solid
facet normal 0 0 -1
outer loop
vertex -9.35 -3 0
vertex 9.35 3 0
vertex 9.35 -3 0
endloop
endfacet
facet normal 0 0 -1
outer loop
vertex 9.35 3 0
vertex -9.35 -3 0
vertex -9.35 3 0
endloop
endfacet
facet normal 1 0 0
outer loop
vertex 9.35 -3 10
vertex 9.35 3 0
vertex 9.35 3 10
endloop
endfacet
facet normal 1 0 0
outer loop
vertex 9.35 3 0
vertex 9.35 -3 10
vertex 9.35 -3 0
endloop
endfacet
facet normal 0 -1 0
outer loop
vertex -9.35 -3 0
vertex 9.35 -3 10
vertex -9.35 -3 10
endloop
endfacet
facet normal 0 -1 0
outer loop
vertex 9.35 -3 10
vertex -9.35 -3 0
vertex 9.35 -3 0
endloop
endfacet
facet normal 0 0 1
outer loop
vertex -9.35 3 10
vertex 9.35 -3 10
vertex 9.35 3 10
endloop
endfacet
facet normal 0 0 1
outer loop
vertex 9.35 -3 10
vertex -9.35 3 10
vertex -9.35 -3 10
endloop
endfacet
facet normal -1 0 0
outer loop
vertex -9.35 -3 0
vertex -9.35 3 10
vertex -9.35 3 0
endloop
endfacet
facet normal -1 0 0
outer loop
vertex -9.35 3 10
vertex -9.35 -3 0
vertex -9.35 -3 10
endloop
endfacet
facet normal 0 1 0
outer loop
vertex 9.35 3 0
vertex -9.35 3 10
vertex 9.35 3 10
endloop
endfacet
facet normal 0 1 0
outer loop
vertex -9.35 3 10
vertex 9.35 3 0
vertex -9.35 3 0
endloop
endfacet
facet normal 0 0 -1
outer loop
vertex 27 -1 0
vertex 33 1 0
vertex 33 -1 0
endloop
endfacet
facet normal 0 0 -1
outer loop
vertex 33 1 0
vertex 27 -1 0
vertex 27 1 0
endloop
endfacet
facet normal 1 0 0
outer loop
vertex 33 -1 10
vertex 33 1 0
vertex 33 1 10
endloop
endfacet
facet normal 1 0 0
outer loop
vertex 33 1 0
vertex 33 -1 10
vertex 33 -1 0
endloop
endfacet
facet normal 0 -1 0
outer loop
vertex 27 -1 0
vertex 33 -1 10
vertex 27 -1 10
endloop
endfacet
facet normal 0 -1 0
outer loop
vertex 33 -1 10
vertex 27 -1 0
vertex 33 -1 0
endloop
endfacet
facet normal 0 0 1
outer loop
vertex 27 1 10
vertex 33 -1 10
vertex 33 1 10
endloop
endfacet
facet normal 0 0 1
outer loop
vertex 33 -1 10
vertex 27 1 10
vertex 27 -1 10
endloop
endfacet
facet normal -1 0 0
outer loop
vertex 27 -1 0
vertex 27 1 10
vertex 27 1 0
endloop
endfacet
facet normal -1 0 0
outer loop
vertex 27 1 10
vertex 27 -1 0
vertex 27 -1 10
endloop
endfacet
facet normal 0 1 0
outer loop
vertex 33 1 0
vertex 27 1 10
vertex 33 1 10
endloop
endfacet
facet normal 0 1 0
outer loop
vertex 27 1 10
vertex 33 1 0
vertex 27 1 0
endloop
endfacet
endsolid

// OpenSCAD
// Built by bench/smallmodels/features/compiler.py from a list of features.
$fn = 64;
difference() {
  union() {
    translate([0, 0, 0]) linear_extrude(height = 10) polygon([[-9.35, -3], [9.35, -3], [9.35, 3], [-9.35, 3]]);
    translate([15, 0, 0]) linear_extrude(height = 10) polygon([[12, -1], [18, -1], [18, 1], [12, 1]]);
  }
  union() {
    translate([-18.7, 0, 0]) rotate([0, 0, 0]) translate([-5, -5, 0]) cube([10, 10, 3]);
    translate([15, -2.25, 0]) rotate([0, 0, 0]) translate([-1, -4.5, 0]) cube([2, 9, 3]);
  }
}
